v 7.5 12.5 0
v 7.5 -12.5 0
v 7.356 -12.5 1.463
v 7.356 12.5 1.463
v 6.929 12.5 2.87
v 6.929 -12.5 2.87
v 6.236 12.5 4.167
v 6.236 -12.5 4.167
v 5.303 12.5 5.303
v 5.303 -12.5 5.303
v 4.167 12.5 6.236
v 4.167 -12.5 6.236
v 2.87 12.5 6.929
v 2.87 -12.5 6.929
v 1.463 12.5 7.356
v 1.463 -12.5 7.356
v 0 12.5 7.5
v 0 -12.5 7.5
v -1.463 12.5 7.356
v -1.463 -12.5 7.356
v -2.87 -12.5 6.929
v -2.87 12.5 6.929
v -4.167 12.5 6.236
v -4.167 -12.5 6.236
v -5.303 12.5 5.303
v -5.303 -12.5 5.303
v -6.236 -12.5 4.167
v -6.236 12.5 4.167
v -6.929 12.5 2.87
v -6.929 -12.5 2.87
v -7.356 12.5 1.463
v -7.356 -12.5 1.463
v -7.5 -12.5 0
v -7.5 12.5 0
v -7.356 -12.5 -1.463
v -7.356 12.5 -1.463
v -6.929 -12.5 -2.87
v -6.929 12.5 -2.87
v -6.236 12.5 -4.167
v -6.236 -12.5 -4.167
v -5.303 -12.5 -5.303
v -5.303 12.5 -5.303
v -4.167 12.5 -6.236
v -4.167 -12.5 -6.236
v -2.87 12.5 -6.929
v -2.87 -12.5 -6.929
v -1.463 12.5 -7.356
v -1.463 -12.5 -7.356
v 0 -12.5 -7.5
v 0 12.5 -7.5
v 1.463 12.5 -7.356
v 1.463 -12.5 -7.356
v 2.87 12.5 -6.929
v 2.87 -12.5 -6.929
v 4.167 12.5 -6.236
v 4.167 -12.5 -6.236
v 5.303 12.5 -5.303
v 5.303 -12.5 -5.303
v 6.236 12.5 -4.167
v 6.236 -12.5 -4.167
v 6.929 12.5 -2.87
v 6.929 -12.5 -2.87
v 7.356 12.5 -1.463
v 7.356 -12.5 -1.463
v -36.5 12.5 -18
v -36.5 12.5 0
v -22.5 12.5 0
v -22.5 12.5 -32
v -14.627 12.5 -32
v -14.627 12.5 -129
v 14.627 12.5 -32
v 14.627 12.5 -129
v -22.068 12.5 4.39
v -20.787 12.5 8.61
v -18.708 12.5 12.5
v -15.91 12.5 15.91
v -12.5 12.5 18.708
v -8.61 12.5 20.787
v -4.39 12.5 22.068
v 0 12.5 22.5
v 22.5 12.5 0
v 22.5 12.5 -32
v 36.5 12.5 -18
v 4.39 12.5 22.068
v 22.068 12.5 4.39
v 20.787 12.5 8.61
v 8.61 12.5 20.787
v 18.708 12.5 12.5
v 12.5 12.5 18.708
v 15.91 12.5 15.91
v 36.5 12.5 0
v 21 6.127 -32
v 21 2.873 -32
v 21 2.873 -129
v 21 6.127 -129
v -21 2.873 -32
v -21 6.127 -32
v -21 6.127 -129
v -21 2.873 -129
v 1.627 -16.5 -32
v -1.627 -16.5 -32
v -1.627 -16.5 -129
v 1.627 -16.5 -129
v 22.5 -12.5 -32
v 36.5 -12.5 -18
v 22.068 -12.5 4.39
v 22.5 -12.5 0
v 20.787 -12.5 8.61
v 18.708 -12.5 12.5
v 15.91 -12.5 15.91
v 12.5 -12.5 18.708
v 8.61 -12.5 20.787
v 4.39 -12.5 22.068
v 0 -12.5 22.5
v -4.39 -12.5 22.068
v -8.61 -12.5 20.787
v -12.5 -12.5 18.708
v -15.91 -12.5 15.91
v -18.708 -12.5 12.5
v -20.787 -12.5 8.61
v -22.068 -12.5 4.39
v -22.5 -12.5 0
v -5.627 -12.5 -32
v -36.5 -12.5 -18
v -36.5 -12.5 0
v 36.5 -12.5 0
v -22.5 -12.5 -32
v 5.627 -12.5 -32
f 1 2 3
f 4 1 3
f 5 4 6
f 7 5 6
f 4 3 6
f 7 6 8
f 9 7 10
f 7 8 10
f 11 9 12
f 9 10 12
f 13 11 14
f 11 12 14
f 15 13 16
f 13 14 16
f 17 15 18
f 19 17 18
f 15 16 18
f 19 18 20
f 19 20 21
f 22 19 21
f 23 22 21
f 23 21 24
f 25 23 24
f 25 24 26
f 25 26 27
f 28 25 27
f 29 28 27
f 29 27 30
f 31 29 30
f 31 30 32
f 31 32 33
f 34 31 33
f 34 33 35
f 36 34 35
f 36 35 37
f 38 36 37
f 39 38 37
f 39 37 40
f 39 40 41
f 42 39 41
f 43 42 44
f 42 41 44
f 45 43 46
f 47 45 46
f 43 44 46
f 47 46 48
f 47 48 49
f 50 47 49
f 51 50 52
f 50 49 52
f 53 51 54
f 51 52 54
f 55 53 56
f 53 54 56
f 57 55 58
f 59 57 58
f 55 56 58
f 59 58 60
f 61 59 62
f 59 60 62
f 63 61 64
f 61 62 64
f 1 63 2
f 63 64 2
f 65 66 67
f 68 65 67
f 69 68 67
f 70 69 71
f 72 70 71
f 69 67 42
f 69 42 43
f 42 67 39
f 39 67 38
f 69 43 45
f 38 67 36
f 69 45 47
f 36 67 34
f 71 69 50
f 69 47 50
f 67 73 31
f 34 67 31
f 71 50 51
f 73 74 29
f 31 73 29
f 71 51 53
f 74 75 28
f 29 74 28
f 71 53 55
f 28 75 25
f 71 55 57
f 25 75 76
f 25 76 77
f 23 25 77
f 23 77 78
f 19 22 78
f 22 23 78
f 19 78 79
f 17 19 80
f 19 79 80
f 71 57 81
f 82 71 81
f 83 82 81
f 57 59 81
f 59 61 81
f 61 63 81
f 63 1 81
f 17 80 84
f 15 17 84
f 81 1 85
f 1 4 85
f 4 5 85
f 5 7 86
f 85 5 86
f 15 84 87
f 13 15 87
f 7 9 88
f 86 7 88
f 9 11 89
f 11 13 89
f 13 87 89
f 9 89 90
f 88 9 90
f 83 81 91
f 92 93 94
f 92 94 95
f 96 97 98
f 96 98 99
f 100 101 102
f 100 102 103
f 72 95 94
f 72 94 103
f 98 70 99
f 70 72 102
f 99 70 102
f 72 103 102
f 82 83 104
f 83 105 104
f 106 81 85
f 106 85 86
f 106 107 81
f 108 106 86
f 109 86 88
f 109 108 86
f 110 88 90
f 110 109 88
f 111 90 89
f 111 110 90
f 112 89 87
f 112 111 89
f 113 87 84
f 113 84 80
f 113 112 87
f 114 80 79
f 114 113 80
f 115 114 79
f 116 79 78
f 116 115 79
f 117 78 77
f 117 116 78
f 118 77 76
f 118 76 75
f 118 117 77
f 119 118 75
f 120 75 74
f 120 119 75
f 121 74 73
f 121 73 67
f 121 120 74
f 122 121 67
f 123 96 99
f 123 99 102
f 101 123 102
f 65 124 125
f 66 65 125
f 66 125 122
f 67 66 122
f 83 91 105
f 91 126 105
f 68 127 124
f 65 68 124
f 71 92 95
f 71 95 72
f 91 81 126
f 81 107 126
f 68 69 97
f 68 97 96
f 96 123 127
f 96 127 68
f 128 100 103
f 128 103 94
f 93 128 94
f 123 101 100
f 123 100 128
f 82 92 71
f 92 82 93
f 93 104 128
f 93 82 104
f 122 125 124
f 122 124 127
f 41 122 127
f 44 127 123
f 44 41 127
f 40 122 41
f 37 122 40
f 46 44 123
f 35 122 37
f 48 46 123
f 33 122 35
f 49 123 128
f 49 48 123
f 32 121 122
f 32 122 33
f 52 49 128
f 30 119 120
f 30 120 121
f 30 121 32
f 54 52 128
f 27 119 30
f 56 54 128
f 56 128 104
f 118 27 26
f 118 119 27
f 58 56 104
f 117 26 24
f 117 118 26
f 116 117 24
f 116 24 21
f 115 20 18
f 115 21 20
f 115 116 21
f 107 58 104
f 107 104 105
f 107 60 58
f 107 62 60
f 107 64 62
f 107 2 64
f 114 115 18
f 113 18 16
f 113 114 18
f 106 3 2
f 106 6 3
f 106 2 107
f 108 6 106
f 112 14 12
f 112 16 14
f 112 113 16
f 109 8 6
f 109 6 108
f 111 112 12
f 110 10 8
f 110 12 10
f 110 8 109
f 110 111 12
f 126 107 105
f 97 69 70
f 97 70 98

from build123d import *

# Parameters (mm, degrees)
PAD_DEPTH    = 12.5
SKETCH001_R  = 7.5
HOLE_DEPTH   = 25.001
PAD001_DEPTH = 97


with BuildPart() as part:
    # Sketch → Pad (new body, symmetric)
    with BuildSketch(Plane.XZ):
        with BuildLine():
            ThreePointArc((22.5, 0), (0, 22.5), (-22.5, 0))
            Line((-36.5, 0), (-22.5, 0))
            Line((-36.5, -18), (-36.5, 0))
            Line((-22.5, -32), (-36.5, -18))
            Line((22.5, -32), (-22.5, -32))
            Line((36.5, -18), (22.5, -32))
            Line((36.5, 0), (36.5, -18))
            Line((22.5, 0), (36.5, 0))
        make_face()
    extrude(amount=PAD_DEPTH, both=True)

    # Sketch001 (on Face10 of Pad) → Hole (cut, through all)
    with BuildSketch(Plane.XZ.offset(12.5)):
        Circle(SKETCH001_R)
    extrude(amount=-HOLE_DEPTH, mode=Mode.SUBTRACT)

    # Sketch002 (on Face5 of Pad) → Pad001 (join)
    with BuildSketch(Plane(origin=(0, 0, -32), x_dir=(1, 0, 0), z_dir=(0, 0, -1))):
        Polygon((-21, -2.872583), (-1.627417, 16.5), (1.627417, 16.5), (21, -2.872583), (21, -6.127417), (14.627417, -12.5), (-14.627417, -12.5), (-21, -6.127417), align=None)
    extrude(amount=PAD001_DEPTH)


solid = part.part
